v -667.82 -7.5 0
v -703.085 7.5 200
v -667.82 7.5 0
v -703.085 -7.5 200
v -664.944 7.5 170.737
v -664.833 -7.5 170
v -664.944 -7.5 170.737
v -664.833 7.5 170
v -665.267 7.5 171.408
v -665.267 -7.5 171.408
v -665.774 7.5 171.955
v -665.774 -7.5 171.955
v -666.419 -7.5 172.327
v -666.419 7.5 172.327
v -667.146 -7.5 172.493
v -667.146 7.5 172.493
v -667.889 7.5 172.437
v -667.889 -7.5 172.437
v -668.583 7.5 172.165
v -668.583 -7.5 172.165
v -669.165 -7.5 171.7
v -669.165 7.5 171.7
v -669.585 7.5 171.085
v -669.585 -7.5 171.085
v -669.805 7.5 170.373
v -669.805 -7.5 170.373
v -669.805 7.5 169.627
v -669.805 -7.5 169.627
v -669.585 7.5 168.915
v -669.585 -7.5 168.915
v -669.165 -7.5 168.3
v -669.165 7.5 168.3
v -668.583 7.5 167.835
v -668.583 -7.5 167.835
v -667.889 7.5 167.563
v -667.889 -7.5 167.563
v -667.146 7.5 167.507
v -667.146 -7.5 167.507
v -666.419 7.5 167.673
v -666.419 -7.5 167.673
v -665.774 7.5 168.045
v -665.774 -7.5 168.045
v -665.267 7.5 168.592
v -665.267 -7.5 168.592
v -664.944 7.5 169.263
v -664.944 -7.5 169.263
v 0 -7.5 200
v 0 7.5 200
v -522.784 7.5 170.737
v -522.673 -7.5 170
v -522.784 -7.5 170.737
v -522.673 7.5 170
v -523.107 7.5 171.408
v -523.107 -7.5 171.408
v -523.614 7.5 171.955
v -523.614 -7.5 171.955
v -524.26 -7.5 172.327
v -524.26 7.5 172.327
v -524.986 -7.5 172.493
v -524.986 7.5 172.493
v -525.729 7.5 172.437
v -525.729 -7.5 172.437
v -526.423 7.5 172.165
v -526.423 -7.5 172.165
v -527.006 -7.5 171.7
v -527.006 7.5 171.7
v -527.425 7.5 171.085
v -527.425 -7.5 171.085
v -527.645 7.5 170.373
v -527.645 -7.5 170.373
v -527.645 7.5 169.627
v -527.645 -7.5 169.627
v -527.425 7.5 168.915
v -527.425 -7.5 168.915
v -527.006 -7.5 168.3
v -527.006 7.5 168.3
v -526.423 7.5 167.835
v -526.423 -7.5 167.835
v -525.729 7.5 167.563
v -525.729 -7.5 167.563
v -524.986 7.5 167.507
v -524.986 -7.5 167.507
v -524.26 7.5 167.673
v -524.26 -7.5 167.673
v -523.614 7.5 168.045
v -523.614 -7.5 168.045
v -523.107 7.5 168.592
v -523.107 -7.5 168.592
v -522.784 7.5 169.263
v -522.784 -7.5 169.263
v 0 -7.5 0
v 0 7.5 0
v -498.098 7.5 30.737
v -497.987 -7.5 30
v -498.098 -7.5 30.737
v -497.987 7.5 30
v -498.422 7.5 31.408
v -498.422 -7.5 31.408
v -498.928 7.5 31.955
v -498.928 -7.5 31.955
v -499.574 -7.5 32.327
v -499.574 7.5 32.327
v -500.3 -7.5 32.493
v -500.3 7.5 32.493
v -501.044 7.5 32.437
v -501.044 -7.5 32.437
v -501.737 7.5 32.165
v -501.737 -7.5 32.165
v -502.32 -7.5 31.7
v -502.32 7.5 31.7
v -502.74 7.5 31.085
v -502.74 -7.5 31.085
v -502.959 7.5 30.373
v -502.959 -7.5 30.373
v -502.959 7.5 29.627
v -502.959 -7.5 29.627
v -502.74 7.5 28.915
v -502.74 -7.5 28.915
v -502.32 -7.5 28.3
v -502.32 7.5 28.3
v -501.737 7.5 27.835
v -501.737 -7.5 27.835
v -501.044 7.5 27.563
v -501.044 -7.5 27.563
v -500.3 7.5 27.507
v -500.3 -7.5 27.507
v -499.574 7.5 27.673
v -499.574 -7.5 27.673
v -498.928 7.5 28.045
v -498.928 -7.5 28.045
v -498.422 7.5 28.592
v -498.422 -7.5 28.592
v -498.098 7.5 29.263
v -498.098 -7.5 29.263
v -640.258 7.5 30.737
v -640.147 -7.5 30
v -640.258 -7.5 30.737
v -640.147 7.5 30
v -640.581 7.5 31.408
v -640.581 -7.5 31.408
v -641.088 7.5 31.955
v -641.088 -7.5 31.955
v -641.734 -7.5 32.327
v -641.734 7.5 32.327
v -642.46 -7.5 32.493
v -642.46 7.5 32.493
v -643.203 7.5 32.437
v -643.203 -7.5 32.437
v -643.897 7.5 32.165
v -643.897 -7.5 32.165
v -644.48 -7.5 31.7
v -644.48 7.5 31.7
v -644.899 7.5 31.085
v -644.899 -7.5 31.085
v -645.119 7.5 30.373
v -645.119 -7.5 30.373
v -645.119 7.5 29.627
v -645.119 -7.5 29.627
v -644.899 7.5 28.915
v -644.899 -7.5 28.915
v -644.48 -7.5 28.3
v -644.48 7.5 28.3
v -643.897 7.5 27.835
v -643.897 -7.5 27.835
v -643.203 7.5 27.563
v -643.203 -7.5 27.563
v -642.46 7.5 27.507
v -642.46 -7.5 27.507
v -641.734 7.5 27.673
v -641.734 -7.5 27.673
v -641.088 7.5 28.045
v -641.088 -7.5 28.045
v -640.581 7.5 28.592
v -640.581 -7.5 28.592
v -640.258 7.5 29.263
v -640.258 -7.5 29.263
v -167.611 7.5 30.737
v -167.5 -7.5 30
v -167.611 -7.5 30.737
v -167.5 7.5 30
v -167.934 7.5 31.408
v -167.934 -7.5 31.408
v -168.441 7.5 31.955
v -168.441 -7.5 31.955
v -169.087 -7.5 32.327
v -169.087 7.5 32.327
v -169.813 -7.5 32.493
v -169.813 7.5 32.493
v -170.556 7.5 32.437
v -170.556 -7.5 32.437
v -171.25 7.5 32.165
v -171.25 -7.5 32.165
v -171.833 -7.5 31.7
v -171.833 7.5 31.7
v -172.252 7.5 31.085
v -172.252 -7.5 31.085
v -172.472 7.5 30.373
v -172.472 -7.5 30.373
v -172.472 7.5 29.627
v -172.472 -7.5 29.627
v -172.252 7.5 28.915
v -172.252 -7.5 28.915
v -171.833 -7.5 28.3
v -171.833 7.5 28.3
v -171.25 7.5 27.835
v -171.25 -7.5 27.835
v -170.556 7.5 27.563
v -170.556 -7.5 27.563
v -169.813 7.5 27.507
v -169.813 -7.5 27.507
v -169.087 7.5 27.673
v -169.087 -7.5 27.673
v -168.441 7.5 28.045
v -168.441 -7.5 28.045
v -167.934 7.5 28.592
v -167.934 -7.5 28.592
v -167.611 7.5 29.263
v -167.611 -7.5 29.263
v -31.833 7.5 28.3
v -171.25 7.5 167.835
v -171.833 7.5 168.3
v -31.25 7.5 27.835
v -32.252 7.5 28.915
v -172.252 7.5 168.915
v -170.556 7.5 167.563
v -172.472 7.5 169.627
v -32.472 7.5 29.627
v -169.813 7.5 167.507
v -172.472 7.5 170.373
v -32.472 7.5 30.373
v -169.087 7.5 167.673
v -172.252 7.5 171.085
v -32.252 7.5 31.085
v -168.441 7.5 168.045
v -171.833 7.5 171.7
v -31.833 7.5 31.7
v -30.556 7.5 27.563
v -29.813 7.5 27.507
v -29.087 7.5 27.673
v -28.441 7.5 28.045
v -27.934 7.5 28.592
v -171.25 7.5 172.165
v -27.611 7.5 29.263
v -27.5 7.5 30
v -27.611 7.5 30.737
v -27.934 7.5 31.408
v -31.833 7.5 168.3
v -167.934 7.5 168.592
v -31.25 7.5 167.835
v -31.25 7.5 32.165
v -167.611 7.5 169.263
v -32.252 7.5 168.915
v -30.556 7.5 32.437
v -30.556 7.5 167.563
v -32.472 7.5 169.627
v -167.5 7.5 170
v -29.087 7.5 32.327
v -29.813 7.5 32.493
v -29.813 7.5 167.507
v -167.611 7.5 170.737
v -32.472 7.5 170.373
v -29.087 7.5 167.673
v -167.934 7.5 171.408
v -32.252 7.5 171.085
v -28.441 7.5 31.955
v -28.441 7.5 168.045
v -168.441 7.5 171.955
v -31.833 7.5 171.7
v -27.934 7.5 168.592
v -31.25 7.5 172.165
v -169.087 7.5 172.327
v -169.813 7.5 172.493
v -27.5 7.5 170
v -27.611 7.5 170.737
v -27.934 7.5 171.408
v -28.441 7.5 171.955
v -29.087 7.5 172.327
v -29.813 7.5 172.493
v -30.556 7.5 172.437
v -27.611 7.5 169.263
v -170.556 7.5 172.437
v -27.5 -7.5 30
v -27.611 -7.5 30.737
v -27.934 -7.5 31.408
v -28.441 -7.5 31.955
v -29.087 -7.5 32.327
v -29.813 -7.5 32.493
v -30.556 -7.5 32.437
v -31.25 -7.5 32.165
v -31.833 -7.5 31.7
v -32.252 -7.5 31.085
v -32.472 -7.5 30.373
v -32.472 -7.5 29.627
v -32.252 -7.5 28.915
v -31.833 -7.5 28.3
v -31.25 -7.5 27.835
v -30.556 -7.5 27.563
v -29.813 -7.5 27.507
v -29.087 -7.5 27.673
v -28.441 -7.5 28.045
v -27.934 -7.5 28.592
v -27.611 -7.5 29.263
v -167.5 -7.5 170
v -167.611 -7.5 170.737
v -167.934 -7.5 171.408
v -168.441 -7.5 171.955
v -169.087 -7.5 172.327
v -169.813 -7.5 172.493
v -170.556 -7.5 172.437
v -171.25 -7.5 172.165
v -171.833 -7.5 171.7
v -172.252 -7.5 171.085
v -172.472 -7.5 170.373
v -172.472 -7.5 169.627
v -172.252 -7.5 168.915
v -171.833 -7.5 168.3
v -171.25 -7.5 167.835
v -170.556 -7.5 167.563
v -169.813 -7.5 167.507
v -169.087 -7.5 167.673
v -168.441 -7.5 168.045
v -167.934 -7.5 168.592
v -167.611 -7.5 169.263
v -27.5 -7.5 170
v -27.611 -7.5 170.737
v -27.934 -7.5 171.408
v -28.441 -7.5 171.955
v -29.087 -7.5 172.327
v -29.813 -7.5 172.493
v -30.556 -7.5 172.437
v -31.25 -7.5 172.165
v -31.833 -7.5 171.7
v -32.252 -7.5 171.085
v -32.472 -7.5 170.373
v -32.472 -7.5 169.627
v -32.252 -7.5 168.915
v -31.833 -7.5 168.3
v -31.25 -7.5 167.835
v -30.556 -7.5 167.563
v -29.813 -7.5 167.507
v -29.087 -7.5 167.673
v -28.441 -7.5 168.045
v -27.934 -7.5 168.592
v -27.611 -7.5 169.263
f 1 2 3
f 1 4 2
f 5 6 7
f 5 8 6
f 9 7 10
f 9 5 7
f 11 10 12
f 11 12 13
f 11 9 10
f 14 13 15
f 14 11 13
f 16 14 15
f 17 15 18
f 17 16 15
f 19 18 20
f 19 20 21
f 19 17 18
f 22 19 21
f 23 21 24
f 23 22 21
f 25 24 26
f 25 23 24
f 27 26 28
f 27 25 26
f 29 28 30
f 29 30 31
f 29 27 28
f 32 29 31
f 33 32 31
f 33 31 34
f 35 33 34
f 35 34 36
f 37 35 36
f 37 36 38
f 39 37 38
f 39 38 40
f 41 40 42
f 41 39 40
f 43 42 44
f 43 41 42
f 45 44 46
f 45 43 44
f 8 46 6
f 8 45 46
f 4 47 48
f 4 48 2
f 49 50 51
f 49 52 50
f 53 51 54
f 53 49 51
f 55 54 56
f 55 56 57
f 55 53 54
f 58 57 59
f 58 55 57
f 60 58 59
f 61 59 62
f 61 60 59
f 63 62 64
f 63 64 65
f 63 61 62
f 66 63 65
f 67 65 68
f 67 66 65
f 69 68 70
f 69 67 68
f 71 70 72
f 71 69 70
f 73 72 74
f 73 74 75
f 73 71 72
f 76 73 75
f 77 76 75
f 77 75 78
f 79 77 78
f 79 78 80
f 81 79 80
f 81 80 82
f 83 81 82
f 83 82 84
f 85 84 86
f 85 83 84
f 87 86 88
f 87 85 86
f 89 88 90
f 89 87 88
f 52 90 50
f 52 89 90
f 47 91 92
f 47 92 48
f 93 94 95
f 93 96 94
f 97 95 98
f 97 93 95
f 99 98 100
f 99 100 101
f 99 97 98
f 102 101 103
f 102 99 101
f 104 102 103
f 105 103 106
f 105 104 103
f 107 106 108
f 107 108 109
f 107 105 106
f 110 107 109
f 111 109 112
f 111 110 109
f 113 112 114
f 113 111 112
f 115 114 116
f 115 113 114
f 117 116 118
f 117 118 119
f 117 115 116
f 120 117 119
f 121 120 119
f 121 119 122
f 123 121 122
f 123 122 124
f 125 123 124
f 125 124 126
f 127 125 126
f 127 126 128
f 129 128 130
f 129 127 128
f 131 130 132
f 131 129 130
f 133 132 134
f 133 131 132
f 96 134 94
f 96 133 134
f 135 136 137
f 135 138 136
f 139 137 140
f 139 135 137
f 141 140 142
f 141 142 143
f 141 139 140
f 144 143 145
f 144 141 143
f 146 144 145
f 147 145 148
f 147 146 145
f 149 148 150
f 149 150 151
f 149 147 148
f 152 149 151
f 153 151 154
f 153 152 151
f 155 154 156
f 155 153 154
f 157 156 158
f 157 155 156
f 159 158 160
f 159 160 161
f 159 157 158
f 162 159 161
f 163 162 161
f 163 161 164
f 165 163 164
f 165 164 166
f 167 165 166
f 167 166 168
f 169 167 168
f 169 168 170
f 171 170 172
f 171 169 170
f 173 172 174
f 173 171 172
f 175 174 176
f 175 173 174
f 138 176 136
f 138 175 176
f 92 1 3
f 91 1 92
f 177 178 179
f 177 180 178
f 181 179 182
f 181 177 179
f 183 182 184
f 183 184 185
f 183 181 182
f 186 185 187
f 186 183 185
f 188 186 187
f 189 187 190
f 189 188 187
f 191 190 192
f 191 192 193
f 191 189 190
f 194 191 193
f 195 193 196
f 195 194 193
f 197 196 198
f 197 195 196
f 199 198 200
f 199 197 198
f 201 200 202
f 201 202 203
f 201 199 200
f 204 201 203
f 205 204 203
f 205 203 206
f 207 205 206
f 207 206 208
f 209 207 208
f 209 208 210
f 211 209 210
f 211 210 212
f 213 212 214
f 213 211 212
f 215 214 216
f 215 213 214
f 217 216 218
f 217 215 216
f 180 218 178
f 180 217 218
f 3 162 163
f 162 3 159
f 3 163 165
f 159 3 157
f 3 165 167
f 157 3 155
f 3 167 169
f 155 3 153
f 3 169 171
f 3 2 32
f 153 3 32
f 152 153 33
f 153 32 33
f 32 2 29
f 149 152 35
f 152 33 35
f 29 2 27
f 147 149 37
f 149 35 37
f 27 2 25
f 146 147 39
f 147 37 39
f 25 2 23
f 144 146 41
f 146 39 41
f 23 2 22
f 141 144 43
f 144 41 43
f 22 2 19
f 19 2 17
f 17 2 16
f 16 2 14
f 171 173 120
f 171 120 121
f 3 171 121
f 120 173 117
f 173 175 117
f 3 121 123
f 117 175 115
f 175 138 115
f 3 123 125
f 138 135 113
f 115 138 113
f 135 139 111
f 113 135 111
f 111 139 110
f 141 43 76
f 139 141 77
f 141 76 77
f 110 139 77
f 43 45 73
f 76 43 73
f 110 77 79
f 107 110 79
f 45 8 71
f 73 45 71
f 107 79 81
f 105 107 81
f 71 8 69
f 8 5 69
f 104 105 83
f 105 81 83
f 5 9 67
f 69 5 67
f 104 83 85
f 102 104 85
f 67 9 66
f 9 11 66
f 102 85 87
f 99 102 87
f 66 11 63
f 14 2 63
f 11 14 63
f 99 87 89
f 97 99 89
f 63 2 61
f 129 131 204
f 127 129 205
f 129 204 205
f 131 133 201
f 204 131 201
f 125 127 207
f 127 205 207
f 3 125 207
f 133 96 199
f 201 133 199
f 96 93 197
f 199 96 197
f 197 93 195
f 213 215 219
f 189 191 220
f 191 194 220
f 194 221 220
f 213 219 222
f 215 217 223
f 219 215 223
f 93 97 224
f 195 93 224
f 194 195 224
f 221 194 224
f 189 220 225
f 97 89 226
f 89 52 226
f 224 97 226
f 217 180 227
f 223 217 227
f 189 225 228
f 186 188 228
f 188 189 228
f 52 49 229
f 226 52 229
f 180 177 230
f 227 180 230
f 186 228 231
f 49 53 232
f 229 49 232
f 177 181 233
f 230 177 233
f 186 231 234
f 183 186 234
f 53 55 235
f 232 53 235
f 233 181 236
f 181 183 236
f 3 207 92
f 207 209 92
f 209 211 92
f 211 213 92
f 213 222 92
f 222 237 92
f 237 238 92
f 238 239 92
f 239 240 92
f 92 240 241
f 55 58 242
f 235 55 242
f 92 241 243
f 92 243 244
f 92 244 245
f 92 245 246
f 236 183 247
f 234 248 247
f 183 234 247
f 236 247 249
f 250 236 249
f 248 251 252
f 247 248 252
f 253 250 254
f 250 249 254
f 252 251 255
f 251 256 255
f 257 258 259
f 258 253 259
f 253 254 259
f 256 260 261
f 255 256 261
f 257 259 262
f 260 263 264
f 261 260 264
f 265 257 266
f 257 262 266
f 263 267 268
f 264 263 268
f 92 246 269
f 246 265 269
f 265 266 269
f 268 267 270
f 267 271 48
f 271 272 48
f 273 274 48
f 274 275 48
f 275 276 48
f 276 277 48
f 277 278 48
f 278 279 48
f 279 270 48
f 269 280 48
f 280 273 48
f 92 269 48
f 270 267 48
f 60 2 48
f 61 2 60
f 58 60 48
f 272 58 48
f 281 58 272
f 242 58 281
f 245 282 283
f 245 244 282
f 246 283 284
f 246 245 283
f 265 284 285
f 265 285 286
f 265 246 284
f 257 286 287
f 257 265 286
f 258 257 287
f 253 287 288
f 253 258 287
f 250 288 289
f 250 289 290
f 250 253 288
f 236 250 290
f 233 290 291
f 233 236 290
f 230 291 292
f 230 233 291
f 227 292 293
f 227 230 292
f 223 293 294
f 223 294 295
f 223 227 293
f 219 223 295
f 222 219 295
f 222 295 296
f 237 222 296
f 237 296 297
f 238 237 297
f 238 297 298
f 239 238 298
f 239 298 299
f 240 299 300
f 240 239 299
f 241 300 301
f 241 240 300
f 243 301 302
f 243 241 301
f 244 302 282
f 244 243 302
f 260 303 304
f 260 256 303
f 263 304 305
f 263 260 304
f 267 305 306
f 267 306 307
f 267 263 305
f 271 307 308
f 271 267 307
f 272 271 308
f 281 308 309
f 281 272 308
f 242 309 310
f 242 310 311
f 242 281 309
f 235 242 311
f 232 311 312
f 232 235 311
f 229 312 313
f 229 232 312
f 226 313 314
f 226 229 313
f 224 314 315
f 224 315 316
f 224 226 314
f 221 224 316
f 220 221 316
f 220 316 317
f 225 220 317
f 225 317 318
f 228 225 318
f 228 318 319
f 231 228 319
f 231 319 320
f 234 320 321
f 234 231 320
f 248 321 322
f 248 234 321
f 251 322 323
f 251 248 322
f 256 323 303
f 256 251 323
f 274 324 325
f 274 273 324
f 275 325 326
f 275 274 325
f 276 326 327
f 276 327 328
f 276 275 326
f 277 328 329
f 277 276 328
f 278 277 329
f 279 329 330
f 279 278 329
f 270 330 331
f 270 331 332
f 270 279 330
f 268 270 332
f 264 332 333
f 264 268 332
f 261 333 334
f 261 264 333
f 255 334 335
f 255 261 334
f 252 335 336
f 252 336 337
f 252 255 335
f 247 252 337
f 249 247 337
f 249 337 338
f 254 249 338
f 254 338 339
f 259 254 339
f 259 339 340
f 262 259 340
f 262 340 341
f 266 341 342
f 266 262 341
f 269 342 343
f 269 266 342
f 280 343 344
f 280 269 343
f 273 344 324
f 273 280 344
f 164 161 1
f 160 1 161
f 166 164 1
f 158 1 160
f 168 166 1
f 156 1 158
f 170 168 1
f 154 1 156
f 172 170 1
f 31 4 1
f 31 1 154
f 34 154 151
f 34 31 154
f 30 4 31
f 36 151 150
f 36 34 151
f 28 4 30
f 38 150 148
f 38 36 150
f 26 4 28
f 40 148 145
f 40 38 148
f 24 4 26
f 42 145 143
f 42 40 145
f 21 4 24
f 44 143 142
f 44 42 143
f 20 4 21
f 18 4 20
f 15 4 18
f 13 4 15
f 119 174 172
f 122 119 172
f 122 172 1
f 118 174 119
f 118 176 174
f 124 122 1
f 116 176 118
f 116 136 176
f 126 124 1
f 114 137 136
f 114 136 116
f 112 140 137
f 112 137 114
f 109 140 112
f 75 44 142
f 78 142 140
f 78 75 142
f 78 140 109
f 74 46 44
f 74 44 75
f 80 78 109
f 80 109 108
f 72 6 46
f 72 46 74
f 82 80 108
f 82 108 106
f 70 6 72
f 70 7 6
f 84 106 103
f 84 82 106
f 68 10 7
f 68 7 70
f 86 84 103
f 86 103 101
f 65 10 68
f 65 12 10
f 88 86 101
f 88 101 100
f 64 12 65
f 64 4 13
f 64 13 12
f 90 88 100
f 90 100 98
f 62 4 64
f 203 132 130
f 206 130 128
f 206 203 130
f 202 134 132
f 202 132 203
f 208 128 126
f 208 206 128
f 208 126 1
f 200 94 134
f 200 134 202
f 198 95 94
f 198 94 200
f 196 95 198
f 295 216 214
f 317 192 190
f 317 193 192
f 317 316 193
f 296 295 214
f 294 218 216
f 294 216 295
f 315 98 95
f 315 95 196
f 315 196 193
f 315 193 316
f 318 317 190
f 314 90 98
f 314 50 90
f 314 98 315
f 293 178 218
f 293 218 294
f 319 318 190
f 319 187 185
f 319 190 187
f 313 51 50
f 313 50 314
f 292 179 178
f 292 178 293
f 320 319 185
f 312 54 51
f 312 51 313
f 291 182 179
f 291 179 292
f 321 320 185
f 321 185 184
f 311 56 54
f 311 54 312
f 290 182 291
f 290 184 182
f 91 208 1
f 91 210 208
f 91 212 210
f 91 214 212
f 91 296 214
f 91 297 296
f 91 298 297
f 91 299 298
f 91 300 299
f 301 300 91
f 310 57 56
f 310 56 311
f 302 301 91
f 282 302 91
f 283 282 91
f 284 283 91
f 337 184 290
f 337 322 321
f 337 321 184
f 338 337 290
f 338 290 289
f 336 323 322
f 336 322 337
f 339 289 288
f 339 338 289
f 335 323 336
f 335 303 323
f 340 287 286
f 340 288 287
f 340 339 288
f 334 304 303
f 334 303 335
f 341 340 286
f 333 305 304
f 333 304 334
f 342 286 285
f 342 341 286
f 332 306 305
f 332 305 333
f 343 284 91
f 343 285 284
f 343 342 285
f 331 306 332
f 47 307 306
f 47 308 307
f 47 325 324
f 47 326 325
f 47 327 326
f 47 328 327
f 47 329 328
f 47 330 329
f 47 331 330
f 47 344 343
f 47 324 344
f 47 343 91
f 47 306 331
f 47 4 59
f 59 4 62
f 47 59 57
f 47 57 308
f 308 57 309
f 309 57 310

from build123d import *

# Parameters (mm, degrees)
F0_R     = 2.5
F1_DEPTH = 7.5


with BuildPart() as f1:
    # F0 (on Front) → F1 (new body, symmetric)
    with BuildSketch(Plane.XZ):
        Polygon((-667.819926, 0), (0, 0), (0, 200), (-703.085322, 200), align=None)
        with Locations((-642.646937, 30)):
            Circle(F0_R, mode=Mode.SUBTRACT)
        with Locations((-500.487212, 30)):
            Circle(F0_R, mode=Mode.SUBTRACT)
        with Locations((-170, 30)):
            Circle(F0_R, mode=Mode.SUBTRACT)
        with Locations((-30, 30)):
            Circle(F0_R, mode=Mode.SUBTRACT)
        with Locations((-667.332715, 170)):
            Circle(F0_R, mode=Mode.SUBTRACT)
        with Locations((-525.172989, 170)):
            Circle(F0_R, mode=Mode.SUBTRACT)
        with Locations((-170, 170)):
            Circle(F0_R, mode=Mode.SUBTRACT)
        with Locations((-30, 170)):
            Circle(F0_R, mode=Mode.SUBTRACT)
    extrude(amount=F1_DEPTH, both=True)


solid = f1.part
